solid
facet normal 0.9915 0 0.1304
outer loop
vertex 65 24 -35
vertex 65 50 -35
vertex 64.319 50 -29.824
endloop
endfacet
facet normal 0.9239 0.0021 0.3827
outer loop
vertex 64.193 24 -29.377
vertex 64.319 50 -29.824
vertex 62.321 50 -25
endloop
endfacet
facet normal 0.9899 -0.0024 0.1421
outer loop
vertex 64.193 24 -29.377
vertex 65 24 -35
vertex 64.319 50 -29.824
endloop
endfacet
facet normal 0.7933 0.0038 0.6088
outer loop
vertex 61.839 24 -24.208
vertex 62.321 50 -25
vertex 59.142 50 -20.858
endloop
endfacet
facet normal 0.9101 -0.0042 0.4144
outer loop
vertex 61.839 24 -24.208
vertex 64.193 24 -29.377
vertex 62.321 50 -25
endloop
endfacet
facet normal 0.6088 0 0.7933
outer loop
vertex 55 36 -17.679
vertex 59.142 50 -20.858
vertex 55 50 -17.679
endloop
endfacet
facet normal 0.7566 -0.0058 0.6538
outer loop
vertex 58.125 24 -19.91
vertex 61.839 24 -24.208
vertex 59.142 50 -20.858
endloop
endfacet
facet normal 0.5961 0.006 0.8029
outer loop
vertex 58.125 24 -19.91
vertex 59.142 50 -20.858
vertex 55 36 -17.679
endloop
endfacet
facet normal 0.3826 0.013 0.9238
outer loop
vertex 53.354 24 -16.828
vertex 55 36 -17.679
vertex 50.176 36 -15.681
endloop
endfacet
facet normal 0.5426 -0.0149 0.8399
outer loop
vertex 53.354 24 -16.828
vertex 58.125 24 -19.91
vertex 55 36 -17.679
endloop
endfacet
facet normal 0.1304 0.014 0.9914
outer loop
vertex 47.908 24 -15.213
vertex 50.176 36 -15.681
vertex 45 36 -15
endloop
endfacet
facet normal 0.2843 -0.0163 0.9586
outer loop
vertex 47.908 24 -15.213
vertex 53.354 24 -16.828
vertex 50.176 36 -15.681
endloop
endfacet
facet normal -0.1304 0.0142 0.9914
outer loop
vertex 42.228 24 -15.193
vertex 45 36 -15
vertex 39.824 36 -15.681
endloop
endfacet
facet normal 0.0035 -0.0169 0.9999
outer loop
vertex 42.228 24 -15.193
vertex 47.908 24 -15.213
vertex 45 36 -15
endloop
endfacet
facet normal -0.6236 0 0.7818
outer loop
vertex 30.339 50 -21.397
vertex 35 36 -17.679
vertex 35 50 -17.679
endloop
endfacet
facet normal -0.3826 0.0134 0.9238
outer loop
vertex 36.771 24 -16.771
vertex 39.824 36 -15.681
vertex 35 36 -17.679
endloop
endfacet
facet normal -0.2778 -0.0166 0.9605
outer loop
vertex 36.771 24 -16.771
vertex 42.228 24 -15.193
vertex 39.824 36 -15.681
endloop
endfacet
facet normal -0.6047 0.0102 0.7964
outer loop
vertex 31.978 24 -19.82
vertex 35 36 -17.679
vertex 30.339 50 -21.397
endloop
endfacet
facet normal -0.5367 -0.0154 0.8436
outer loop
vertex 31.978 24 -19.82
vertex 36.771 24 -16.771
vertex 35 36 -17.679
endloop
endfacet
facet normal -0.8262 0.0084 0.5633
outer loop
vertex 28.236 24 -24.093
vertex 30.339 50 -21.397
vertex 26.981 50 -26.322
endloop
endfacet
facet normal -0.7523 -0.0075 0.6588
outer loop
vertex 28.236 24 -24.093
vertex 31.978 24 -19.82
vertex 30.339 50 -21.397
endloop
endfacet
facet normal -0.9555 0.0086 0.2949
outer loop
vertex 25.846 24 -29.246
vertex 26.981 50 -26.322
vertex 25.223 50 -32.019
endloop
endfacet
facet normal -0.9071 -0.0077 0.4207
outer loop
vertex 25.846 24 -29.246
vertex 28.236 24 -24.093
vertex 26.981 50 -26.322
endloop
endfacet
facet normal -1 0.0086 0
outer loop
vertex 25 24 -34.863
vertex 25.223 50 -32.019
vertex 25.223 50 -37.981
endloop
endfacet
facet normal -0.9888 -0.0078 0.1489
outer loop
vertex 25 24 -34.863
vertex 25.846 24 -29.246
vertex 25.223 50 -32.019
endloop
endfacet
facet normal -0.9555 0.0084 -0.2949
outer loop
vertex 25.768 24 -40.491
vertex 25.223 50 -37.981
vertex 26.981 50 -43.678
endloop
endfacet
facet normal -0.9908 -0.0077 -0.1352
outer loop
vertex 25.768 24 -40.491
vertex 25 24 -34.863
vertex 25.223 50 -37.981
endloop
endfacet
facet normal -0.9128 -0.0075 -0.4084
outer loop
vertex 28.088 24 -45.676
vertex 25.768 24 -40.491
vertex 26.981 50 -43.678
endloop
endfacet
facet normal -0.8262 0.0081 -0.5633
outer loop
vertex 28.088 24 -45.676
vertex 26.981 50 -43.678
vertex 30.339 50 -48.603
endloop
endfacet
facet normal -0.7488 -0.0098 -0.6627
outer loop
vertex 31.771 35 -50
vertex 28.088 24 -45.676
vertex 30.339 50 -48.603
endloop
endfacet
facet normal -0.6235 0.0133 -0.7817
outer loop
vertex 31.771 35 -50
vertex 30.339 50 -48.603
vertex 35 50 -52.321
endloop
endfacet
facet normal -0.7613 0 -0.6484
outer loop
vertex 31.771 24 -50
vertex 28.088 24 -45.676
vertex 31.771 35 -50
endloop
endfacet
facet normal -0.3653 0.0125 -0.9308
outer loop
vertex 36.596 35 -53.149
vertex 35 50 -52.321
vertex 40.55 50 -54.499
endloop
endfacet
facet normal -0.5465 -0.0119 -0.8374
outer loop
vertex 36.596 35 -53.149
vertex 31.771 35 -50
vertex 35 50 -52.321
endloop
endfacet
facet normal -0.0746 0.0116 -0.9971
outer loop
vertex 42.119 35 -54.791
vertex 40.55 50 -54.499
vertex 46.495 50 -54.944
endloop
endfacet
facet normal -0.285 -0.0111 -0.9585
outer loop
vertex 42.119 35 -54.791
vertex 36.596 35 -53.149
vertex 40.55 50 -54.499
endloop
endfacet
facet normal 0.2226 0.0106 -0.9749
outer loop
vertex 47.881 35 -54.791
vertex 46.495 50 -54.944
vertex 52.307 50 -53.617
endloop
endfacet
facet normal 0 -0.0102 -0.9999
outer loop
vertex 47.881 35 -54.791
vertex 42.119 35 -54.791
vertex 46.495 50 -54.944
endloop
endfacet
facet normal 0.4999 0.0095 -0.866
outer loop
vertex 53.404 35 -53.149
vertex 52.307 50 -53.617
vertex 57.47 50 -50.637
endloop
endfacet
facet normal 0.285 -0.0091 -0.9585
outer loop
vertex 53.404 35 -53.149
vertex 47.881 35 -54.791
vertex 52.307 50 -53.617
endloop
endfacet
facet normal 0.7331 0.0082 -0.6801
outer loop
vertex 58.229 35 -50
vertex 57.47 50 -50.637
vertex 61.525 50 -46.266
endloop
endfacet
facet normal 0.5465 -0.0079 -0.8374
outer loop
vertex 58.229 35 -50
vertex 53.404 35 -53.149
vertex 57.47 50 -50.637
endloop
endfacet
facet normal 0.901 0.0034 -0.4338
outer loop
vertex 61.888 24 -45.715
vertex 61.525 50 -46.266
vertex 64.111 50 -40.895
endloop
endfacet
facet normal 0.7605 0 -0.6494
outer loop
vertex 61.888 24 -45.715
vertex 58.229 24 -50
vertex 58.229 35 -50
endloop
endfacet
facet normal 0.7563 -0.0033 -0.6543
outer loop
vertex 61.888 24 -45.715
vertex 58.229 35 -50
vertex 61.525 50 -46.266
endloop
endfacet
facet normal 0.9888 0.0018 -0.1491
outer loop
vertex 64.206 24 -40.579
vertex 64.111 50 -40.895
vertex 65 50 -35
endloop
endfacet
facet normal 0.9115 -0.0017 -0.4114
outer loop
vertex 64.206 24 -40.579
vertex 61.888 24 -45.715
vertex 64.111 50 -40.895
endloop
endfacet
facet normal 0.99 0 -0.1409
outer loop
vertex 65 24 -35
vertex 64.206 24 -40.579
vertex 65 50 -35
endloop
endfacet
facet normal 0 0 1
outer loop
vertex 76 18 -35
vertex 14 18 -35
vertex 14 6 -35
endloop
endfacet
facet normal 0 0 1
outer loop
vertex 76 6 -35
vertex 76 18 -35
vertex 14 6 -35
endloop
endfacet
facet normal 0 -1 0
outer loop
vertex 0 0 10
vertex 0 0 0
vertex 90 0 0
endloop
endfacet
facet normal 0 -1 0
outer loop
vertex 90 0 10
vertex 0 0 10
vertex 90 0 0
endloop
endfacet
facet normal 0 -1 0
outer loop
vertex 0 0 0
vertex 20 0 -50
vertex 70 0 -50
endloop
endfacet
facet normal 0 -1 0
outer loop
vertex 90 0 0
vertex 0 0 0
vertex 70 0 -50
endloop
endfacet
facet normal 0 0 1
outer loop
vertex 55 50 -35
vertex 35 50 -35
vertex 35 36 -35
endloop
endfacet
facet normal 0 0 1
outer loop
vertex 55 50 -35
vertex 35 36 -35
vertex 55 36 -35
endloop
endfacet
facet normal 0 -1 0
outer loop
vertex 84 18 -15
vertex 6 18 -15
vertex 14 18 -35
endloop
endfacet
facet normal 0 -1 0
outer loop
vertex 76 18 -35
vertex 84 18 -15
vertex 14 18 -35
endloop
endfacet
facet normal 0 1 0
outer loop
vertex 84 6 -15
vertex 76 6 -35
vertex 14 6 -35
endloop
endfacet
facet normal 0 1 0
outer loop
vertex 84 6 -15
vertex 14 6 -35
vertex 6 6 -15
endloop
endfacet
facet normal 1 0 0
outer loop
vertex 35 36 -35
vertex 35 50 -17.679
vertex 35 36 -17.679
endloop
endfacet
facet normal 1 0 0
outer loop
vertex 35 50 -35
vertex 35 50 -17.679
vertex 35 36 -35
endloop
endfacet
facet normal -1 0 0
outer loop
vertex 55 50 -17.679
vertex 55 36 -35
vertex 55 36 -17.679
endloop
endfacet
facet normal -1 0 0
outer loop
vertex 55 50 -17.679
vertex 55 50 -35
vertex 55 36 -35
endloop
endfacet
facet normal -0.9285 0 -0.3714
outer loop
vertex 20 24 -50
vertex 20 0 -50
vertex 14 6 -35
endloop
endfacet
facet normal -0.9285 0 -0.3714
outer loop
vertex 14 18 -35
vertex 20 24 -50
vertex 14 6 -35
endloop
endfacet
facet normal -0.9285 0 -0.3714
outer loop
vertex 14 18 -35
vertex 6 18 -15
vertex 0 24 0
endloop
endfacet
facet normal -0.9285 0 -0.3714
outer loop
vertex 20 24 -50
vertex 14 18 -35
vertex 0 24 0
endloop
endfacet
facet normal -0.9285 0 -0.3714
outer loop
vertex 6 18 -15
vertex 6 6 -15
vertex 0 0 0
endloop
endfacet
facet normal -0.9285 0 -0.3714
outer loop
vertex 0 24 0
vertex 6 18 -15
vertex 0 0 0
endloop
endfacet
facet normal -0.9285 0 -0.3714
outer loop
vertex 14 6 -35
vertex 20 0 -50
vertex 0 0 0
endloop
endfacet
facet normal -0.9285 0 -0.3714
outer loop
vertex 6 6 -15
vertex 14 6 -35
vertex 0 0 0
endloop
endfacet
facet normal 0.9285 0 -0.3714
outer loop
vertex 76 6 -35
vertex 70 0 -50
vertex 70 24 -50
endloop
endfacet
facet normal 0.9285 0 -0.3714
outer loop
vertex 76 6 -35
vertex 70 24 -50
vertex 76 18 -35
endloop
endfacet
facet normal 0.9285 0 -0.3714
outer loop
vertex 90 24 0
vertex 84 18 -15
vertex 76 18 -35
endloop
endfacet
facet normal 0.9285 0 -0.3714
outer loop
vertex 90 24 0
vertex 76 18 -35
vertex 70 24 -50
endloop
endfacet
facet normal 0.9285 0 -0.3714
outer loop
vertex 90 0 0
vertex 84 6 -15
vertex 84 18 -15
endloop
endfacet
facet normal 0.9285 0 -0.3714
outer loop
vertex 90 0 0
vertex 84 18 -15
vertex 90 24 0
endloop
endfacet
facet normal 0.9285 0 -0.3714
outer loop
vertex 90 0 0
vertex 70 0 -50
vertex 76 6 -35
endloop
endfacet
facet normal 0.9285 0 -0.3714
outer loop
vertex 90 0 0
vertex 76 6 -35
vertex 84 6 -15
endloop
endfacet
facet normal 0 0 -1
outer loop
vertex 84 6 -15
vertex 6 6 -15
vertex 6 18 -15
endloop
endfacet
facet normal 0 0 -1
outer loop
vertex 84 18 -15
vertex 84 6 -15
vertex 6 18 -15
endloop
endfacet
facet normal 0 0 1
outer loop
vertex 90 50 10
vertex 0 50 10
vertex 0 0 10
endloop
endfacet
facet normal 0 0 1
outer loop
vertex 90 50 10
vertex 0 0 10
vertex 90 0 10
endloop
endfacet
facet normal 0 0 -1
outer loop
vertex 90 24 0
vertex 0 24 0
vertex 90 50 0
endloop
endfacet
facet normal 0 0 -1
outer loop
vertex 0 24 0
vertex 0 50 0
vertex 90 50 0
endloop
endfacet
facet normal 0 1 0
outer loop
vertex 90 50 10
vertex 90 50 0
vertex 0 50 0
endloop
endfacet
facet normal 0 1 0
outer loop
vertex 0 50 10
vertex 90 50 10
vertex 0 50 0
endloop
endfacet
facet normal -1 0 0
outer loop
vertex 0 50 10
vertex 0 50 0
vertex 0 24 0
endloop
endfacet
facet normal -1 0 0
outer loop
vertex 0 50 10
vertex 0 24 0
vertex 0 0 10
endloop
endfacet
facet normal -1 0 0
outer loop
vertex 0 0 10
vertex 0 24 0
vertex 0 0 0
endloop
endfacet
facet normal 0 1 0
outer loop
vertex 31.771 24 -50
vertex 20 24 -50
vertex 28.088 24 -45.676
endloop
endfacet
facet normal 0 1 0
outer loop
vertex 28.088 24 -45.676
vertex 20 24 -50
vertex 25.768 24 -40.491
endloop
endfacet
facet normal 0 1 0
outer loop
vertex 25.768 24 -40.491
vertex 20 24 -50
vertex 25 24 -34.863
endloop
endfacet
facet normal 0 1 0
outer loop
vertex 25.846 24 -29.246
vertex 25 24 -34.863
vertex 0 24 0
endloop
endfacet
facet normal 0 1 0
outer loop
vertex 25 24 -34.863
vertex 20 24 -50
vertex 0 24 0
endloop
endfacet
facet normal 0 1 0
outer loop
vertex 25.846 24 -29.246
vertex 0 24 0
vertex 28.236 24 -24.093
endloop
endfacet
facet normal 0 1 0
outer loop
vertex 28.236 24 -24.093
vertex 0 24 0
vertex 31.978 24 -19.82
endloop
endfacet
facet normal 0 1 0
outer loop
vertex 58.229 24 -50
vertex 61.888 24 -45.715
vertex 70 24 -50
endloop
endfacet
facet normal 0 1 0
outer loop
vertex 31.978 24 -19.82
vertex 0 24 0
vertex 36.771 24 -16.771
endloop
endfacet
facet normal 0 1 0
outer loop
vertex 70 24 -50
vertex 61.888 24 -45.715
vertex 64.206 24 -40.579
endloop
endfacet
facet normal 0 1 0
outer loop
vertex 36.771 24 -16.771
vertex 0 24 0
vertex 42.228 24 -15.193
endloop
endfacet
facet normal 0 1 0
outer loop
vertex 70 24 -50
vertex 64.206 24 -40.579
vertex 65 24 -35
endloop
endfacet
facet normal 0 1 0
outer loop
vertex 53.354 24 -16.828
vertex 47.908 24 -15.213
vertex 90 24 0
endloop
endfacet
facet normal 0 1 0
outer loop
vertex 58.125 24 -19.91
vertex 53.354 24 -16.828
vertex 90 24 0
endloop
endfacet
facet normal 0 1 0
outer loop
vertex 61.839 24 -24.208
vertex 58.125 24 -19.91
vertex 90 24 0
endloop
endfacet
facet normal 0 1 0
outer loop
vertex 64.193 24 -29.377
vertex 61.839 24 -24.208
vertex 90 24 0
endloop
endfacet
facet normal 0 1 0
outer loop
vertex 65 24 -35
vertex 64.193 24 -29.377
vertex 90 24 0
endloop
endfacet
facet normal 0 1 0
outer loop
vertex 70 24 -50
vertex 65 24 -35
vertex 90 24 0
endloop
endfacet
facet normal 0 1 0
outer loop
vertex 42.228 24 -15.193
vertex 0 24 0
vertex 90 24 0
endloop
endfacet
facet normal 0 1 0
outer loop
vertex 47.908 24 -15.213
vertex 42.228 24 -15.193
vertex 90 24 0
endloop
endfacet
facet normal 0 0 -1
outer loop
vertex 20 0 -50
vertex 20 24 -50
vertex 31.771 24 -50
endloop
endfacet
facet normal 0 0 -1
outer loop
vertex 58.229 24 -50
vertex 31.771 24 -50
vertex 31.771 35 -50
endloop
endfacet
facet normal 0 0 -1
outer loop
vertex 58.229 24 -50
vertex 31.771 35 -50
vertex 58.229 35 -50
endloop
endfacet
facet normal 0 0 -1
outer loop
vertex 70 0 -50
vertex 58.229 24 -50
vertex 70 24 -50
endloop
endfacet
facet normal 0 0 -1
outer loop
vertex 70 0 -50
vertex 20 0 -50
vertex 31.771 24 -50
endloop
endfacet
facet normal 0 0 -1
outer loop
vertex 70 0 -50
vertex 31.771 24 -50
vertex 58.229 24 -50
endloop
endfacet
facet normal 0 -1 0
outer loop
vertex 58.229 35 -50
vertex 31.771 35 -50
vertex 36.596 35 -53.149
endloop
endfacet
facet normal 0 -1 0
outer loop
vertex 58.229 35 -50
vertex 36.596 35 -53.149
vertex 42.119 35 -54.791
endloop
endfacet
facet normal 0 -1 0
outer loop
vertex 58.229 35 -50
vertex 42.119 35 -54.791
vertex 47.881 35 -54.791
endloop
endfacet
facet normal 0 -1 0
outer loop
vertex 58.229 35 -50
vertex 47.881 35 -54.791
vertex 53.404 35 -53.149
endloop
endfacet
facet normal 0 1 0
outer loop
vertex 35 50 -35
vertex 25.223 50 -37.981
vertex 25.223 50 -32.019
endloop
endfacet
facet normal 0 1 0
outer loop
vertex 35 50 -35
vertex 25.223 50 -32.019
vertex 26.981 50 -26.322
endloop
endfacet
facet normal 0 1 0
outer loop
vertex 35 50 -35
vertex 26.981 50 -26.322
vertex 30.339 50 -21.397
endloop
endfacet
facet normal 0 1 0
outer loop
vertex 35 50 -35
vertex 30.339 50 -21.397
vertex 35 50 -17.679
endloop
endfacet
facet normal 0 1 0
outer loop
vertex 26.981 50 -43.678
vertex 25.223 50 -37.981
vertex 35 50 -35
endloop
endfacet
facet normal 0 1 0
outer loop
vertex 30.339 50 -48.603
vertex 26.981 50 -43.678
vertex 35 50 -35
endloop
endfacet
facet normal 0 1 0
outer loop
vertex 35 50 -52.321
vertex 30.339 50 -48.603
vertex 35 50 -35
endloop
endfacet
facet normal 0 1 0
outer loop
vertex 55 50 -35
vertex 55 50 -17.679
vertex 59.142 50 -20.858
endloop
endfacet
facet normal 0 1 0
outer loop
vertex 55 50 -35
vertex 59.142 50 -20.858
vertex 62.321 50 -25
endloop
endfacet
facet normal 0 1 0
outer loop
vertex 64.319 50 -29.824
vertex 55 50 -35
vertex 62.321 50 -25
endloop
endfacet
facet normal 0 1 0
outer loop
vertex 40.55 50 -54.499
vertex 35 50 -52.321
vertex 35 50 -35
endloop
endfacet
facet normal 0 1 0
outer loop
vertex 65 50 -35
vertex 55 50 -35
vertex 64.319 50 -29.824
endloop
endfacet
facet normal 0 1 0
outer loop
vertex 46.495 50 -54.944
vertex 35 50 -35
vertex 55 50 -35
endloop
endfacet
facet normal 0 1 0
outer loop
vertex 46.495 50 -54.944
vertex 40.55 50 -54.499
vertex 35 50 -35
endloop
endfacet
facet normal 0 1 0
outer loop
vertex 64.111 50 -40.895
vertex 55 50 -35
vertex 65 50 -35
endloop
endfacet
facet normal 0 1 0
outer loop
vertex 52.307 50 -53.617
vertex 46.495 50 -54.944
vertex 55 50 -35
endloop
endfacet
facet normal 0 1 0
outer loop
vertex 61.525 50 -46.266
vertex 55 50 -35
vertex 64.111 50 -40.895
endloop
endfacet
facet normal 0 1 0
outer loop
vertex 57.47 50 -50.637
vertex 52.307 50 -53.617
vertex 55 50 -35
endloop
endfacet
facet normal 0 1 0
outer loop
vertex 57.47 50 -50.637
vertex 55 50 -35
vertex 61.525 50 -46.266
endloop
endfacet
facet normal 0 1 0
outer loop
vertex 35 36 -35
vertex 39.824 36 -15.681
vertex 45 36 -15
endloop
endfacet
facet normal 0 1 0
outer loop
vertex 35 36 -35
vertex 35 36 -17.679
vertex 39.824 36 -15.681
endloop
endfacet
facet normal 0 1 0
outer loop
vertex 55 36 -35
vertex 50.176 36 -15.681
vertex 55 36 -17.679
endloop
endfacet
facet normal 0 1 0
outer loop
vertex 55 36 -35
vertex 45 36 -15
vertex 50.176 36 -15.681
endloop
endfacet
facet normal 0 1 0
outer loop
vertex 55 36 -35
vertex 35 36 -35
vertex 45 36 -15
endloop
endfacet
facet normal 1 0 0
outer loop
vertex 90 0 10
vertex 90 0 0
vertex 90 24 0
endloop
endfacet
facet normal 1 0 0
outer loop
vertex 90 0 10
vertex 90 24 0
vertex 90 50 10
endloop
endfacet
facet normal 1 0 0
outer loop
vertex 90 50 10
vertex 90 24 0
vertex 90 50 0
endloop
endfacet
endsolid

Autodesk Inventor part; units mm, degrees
ref_plane "YZ Plane" through (0, 0, 0) normal (1, 0, 0) x (0, 1, 0)
ref_plane "XZ Plane" through (0, 0, 0) normal (0, 1, 0) x (-1, 0, 0)
ref_plane "XY Plane" through (0, 0, 0) normal (0, 0, 1) x (1, 0, 0)
sketch "Szkic1" plane through (0, 0, 0) normal (0, 0, 1) x (1, 0, 0)
  line L0 (0, 0) -> (90, 0)
  line L1 (90, 0) -> (90, 50)
  line L2 (90, 50) -> (0, 50)
  line L3 (0, 50) -> (0, 0)
  dimension "d0" = 90
  dimension "d1" = 50
extrude "Wyciągnięcie proste1" add sketch "Szkic1" along normal blind 10
sketch "Szkic2" plane through (0, 0, 0) normal (0, -1, 0) x (1, 0, 0)
  line L0 (90, 0) -> (0, 0) projected
  line L1 (20, -50) -> (70, -50)
  line L2 (70, -50) -> (90, 0)
  line L3 (90, 0) -> (0, 0)
  line L4 (0, 0) -> (0, 10) projected
  line L5 (20, -50) -> (0, 0)
  line L6 (0, 0) -> (90, 0)
  dimension "d6" = 50
extrude "Wyciągnięcie proste2" add sketch "Szkic2" against normal blind 24
sketch "Szkic3" plane through (0, 24, 0) normal (0, 1, 0) x (1, 0, 0)
  line L0 (0, 0) -> (0, -10) projected
  line L1 (90, 0) -> (0, 0) projected
  circle A0 centre (45, 35) radius 20
  dimension "d11" = 40
extrude "Wyciągnięcie proste3" add sketch "Szkic3" along normal blind 26
sketch "Szkic4" plane through (0, 0, 10) normal (0, -1, 0) x (1, 0, 0)
  line L0 (70, -60) -> (58.2288, -60) projected
  line L1 (70, -60) -> (70, -66.9782)
  line L2 (70, -66.9782) -> (20, -66.9782)
  line L3 (31.7712, -60) -> (20, -60) projected
  line L4 (20, -66.9782) -> (20, -60)
  line L5 (20, -60) -> (70, -60)
  point P0 (0, -10)
extrude "Wyciągnięcie proste4" cut sketch "Szkic4" against normal blind 35
sketch "Szkic5" plane through (0, 0, 10) normal (-1, 0, 0) x (0, 0, 1)
  line L0 (-25, 6) -> (-25, 18)
  line L1 (-25, 18) -> (-45, 18)
  line L2 (-45, 18) -> (-45, 6)
  line L3 (-45, 6) -> (-25, 6)
  point P0 (-10, 0)
  dimension "d18" = 12
  dimension "d19" = 20
extrude "Wyciągnięcie proste5" cut sketch "Szkic5" against normal blind 95
sketch "Szkic6" plane through (45, 50, -35) normal (0, 1, 0) x (1, 0, 0)
  line L0 (-31, 0) -> (31, 0) projected
  line L1 (0, 0) -> (10, 0)
  line L2 (10, 0) -> (10, -28.0711)
  line L3 (10, -28.0711) -> (-10, -28.0711)
  line L4 (-10, -28.0711) -> (-10, 0)
  line L5 (-10, 0) -> (0, 0)
  point P0 (-45, -35)
  dimension "d22" = 10
  dimension "d23" = 20
extrude "Wyciągnięcie proste6" cut sketch "Szkic6" against normal blind 14
